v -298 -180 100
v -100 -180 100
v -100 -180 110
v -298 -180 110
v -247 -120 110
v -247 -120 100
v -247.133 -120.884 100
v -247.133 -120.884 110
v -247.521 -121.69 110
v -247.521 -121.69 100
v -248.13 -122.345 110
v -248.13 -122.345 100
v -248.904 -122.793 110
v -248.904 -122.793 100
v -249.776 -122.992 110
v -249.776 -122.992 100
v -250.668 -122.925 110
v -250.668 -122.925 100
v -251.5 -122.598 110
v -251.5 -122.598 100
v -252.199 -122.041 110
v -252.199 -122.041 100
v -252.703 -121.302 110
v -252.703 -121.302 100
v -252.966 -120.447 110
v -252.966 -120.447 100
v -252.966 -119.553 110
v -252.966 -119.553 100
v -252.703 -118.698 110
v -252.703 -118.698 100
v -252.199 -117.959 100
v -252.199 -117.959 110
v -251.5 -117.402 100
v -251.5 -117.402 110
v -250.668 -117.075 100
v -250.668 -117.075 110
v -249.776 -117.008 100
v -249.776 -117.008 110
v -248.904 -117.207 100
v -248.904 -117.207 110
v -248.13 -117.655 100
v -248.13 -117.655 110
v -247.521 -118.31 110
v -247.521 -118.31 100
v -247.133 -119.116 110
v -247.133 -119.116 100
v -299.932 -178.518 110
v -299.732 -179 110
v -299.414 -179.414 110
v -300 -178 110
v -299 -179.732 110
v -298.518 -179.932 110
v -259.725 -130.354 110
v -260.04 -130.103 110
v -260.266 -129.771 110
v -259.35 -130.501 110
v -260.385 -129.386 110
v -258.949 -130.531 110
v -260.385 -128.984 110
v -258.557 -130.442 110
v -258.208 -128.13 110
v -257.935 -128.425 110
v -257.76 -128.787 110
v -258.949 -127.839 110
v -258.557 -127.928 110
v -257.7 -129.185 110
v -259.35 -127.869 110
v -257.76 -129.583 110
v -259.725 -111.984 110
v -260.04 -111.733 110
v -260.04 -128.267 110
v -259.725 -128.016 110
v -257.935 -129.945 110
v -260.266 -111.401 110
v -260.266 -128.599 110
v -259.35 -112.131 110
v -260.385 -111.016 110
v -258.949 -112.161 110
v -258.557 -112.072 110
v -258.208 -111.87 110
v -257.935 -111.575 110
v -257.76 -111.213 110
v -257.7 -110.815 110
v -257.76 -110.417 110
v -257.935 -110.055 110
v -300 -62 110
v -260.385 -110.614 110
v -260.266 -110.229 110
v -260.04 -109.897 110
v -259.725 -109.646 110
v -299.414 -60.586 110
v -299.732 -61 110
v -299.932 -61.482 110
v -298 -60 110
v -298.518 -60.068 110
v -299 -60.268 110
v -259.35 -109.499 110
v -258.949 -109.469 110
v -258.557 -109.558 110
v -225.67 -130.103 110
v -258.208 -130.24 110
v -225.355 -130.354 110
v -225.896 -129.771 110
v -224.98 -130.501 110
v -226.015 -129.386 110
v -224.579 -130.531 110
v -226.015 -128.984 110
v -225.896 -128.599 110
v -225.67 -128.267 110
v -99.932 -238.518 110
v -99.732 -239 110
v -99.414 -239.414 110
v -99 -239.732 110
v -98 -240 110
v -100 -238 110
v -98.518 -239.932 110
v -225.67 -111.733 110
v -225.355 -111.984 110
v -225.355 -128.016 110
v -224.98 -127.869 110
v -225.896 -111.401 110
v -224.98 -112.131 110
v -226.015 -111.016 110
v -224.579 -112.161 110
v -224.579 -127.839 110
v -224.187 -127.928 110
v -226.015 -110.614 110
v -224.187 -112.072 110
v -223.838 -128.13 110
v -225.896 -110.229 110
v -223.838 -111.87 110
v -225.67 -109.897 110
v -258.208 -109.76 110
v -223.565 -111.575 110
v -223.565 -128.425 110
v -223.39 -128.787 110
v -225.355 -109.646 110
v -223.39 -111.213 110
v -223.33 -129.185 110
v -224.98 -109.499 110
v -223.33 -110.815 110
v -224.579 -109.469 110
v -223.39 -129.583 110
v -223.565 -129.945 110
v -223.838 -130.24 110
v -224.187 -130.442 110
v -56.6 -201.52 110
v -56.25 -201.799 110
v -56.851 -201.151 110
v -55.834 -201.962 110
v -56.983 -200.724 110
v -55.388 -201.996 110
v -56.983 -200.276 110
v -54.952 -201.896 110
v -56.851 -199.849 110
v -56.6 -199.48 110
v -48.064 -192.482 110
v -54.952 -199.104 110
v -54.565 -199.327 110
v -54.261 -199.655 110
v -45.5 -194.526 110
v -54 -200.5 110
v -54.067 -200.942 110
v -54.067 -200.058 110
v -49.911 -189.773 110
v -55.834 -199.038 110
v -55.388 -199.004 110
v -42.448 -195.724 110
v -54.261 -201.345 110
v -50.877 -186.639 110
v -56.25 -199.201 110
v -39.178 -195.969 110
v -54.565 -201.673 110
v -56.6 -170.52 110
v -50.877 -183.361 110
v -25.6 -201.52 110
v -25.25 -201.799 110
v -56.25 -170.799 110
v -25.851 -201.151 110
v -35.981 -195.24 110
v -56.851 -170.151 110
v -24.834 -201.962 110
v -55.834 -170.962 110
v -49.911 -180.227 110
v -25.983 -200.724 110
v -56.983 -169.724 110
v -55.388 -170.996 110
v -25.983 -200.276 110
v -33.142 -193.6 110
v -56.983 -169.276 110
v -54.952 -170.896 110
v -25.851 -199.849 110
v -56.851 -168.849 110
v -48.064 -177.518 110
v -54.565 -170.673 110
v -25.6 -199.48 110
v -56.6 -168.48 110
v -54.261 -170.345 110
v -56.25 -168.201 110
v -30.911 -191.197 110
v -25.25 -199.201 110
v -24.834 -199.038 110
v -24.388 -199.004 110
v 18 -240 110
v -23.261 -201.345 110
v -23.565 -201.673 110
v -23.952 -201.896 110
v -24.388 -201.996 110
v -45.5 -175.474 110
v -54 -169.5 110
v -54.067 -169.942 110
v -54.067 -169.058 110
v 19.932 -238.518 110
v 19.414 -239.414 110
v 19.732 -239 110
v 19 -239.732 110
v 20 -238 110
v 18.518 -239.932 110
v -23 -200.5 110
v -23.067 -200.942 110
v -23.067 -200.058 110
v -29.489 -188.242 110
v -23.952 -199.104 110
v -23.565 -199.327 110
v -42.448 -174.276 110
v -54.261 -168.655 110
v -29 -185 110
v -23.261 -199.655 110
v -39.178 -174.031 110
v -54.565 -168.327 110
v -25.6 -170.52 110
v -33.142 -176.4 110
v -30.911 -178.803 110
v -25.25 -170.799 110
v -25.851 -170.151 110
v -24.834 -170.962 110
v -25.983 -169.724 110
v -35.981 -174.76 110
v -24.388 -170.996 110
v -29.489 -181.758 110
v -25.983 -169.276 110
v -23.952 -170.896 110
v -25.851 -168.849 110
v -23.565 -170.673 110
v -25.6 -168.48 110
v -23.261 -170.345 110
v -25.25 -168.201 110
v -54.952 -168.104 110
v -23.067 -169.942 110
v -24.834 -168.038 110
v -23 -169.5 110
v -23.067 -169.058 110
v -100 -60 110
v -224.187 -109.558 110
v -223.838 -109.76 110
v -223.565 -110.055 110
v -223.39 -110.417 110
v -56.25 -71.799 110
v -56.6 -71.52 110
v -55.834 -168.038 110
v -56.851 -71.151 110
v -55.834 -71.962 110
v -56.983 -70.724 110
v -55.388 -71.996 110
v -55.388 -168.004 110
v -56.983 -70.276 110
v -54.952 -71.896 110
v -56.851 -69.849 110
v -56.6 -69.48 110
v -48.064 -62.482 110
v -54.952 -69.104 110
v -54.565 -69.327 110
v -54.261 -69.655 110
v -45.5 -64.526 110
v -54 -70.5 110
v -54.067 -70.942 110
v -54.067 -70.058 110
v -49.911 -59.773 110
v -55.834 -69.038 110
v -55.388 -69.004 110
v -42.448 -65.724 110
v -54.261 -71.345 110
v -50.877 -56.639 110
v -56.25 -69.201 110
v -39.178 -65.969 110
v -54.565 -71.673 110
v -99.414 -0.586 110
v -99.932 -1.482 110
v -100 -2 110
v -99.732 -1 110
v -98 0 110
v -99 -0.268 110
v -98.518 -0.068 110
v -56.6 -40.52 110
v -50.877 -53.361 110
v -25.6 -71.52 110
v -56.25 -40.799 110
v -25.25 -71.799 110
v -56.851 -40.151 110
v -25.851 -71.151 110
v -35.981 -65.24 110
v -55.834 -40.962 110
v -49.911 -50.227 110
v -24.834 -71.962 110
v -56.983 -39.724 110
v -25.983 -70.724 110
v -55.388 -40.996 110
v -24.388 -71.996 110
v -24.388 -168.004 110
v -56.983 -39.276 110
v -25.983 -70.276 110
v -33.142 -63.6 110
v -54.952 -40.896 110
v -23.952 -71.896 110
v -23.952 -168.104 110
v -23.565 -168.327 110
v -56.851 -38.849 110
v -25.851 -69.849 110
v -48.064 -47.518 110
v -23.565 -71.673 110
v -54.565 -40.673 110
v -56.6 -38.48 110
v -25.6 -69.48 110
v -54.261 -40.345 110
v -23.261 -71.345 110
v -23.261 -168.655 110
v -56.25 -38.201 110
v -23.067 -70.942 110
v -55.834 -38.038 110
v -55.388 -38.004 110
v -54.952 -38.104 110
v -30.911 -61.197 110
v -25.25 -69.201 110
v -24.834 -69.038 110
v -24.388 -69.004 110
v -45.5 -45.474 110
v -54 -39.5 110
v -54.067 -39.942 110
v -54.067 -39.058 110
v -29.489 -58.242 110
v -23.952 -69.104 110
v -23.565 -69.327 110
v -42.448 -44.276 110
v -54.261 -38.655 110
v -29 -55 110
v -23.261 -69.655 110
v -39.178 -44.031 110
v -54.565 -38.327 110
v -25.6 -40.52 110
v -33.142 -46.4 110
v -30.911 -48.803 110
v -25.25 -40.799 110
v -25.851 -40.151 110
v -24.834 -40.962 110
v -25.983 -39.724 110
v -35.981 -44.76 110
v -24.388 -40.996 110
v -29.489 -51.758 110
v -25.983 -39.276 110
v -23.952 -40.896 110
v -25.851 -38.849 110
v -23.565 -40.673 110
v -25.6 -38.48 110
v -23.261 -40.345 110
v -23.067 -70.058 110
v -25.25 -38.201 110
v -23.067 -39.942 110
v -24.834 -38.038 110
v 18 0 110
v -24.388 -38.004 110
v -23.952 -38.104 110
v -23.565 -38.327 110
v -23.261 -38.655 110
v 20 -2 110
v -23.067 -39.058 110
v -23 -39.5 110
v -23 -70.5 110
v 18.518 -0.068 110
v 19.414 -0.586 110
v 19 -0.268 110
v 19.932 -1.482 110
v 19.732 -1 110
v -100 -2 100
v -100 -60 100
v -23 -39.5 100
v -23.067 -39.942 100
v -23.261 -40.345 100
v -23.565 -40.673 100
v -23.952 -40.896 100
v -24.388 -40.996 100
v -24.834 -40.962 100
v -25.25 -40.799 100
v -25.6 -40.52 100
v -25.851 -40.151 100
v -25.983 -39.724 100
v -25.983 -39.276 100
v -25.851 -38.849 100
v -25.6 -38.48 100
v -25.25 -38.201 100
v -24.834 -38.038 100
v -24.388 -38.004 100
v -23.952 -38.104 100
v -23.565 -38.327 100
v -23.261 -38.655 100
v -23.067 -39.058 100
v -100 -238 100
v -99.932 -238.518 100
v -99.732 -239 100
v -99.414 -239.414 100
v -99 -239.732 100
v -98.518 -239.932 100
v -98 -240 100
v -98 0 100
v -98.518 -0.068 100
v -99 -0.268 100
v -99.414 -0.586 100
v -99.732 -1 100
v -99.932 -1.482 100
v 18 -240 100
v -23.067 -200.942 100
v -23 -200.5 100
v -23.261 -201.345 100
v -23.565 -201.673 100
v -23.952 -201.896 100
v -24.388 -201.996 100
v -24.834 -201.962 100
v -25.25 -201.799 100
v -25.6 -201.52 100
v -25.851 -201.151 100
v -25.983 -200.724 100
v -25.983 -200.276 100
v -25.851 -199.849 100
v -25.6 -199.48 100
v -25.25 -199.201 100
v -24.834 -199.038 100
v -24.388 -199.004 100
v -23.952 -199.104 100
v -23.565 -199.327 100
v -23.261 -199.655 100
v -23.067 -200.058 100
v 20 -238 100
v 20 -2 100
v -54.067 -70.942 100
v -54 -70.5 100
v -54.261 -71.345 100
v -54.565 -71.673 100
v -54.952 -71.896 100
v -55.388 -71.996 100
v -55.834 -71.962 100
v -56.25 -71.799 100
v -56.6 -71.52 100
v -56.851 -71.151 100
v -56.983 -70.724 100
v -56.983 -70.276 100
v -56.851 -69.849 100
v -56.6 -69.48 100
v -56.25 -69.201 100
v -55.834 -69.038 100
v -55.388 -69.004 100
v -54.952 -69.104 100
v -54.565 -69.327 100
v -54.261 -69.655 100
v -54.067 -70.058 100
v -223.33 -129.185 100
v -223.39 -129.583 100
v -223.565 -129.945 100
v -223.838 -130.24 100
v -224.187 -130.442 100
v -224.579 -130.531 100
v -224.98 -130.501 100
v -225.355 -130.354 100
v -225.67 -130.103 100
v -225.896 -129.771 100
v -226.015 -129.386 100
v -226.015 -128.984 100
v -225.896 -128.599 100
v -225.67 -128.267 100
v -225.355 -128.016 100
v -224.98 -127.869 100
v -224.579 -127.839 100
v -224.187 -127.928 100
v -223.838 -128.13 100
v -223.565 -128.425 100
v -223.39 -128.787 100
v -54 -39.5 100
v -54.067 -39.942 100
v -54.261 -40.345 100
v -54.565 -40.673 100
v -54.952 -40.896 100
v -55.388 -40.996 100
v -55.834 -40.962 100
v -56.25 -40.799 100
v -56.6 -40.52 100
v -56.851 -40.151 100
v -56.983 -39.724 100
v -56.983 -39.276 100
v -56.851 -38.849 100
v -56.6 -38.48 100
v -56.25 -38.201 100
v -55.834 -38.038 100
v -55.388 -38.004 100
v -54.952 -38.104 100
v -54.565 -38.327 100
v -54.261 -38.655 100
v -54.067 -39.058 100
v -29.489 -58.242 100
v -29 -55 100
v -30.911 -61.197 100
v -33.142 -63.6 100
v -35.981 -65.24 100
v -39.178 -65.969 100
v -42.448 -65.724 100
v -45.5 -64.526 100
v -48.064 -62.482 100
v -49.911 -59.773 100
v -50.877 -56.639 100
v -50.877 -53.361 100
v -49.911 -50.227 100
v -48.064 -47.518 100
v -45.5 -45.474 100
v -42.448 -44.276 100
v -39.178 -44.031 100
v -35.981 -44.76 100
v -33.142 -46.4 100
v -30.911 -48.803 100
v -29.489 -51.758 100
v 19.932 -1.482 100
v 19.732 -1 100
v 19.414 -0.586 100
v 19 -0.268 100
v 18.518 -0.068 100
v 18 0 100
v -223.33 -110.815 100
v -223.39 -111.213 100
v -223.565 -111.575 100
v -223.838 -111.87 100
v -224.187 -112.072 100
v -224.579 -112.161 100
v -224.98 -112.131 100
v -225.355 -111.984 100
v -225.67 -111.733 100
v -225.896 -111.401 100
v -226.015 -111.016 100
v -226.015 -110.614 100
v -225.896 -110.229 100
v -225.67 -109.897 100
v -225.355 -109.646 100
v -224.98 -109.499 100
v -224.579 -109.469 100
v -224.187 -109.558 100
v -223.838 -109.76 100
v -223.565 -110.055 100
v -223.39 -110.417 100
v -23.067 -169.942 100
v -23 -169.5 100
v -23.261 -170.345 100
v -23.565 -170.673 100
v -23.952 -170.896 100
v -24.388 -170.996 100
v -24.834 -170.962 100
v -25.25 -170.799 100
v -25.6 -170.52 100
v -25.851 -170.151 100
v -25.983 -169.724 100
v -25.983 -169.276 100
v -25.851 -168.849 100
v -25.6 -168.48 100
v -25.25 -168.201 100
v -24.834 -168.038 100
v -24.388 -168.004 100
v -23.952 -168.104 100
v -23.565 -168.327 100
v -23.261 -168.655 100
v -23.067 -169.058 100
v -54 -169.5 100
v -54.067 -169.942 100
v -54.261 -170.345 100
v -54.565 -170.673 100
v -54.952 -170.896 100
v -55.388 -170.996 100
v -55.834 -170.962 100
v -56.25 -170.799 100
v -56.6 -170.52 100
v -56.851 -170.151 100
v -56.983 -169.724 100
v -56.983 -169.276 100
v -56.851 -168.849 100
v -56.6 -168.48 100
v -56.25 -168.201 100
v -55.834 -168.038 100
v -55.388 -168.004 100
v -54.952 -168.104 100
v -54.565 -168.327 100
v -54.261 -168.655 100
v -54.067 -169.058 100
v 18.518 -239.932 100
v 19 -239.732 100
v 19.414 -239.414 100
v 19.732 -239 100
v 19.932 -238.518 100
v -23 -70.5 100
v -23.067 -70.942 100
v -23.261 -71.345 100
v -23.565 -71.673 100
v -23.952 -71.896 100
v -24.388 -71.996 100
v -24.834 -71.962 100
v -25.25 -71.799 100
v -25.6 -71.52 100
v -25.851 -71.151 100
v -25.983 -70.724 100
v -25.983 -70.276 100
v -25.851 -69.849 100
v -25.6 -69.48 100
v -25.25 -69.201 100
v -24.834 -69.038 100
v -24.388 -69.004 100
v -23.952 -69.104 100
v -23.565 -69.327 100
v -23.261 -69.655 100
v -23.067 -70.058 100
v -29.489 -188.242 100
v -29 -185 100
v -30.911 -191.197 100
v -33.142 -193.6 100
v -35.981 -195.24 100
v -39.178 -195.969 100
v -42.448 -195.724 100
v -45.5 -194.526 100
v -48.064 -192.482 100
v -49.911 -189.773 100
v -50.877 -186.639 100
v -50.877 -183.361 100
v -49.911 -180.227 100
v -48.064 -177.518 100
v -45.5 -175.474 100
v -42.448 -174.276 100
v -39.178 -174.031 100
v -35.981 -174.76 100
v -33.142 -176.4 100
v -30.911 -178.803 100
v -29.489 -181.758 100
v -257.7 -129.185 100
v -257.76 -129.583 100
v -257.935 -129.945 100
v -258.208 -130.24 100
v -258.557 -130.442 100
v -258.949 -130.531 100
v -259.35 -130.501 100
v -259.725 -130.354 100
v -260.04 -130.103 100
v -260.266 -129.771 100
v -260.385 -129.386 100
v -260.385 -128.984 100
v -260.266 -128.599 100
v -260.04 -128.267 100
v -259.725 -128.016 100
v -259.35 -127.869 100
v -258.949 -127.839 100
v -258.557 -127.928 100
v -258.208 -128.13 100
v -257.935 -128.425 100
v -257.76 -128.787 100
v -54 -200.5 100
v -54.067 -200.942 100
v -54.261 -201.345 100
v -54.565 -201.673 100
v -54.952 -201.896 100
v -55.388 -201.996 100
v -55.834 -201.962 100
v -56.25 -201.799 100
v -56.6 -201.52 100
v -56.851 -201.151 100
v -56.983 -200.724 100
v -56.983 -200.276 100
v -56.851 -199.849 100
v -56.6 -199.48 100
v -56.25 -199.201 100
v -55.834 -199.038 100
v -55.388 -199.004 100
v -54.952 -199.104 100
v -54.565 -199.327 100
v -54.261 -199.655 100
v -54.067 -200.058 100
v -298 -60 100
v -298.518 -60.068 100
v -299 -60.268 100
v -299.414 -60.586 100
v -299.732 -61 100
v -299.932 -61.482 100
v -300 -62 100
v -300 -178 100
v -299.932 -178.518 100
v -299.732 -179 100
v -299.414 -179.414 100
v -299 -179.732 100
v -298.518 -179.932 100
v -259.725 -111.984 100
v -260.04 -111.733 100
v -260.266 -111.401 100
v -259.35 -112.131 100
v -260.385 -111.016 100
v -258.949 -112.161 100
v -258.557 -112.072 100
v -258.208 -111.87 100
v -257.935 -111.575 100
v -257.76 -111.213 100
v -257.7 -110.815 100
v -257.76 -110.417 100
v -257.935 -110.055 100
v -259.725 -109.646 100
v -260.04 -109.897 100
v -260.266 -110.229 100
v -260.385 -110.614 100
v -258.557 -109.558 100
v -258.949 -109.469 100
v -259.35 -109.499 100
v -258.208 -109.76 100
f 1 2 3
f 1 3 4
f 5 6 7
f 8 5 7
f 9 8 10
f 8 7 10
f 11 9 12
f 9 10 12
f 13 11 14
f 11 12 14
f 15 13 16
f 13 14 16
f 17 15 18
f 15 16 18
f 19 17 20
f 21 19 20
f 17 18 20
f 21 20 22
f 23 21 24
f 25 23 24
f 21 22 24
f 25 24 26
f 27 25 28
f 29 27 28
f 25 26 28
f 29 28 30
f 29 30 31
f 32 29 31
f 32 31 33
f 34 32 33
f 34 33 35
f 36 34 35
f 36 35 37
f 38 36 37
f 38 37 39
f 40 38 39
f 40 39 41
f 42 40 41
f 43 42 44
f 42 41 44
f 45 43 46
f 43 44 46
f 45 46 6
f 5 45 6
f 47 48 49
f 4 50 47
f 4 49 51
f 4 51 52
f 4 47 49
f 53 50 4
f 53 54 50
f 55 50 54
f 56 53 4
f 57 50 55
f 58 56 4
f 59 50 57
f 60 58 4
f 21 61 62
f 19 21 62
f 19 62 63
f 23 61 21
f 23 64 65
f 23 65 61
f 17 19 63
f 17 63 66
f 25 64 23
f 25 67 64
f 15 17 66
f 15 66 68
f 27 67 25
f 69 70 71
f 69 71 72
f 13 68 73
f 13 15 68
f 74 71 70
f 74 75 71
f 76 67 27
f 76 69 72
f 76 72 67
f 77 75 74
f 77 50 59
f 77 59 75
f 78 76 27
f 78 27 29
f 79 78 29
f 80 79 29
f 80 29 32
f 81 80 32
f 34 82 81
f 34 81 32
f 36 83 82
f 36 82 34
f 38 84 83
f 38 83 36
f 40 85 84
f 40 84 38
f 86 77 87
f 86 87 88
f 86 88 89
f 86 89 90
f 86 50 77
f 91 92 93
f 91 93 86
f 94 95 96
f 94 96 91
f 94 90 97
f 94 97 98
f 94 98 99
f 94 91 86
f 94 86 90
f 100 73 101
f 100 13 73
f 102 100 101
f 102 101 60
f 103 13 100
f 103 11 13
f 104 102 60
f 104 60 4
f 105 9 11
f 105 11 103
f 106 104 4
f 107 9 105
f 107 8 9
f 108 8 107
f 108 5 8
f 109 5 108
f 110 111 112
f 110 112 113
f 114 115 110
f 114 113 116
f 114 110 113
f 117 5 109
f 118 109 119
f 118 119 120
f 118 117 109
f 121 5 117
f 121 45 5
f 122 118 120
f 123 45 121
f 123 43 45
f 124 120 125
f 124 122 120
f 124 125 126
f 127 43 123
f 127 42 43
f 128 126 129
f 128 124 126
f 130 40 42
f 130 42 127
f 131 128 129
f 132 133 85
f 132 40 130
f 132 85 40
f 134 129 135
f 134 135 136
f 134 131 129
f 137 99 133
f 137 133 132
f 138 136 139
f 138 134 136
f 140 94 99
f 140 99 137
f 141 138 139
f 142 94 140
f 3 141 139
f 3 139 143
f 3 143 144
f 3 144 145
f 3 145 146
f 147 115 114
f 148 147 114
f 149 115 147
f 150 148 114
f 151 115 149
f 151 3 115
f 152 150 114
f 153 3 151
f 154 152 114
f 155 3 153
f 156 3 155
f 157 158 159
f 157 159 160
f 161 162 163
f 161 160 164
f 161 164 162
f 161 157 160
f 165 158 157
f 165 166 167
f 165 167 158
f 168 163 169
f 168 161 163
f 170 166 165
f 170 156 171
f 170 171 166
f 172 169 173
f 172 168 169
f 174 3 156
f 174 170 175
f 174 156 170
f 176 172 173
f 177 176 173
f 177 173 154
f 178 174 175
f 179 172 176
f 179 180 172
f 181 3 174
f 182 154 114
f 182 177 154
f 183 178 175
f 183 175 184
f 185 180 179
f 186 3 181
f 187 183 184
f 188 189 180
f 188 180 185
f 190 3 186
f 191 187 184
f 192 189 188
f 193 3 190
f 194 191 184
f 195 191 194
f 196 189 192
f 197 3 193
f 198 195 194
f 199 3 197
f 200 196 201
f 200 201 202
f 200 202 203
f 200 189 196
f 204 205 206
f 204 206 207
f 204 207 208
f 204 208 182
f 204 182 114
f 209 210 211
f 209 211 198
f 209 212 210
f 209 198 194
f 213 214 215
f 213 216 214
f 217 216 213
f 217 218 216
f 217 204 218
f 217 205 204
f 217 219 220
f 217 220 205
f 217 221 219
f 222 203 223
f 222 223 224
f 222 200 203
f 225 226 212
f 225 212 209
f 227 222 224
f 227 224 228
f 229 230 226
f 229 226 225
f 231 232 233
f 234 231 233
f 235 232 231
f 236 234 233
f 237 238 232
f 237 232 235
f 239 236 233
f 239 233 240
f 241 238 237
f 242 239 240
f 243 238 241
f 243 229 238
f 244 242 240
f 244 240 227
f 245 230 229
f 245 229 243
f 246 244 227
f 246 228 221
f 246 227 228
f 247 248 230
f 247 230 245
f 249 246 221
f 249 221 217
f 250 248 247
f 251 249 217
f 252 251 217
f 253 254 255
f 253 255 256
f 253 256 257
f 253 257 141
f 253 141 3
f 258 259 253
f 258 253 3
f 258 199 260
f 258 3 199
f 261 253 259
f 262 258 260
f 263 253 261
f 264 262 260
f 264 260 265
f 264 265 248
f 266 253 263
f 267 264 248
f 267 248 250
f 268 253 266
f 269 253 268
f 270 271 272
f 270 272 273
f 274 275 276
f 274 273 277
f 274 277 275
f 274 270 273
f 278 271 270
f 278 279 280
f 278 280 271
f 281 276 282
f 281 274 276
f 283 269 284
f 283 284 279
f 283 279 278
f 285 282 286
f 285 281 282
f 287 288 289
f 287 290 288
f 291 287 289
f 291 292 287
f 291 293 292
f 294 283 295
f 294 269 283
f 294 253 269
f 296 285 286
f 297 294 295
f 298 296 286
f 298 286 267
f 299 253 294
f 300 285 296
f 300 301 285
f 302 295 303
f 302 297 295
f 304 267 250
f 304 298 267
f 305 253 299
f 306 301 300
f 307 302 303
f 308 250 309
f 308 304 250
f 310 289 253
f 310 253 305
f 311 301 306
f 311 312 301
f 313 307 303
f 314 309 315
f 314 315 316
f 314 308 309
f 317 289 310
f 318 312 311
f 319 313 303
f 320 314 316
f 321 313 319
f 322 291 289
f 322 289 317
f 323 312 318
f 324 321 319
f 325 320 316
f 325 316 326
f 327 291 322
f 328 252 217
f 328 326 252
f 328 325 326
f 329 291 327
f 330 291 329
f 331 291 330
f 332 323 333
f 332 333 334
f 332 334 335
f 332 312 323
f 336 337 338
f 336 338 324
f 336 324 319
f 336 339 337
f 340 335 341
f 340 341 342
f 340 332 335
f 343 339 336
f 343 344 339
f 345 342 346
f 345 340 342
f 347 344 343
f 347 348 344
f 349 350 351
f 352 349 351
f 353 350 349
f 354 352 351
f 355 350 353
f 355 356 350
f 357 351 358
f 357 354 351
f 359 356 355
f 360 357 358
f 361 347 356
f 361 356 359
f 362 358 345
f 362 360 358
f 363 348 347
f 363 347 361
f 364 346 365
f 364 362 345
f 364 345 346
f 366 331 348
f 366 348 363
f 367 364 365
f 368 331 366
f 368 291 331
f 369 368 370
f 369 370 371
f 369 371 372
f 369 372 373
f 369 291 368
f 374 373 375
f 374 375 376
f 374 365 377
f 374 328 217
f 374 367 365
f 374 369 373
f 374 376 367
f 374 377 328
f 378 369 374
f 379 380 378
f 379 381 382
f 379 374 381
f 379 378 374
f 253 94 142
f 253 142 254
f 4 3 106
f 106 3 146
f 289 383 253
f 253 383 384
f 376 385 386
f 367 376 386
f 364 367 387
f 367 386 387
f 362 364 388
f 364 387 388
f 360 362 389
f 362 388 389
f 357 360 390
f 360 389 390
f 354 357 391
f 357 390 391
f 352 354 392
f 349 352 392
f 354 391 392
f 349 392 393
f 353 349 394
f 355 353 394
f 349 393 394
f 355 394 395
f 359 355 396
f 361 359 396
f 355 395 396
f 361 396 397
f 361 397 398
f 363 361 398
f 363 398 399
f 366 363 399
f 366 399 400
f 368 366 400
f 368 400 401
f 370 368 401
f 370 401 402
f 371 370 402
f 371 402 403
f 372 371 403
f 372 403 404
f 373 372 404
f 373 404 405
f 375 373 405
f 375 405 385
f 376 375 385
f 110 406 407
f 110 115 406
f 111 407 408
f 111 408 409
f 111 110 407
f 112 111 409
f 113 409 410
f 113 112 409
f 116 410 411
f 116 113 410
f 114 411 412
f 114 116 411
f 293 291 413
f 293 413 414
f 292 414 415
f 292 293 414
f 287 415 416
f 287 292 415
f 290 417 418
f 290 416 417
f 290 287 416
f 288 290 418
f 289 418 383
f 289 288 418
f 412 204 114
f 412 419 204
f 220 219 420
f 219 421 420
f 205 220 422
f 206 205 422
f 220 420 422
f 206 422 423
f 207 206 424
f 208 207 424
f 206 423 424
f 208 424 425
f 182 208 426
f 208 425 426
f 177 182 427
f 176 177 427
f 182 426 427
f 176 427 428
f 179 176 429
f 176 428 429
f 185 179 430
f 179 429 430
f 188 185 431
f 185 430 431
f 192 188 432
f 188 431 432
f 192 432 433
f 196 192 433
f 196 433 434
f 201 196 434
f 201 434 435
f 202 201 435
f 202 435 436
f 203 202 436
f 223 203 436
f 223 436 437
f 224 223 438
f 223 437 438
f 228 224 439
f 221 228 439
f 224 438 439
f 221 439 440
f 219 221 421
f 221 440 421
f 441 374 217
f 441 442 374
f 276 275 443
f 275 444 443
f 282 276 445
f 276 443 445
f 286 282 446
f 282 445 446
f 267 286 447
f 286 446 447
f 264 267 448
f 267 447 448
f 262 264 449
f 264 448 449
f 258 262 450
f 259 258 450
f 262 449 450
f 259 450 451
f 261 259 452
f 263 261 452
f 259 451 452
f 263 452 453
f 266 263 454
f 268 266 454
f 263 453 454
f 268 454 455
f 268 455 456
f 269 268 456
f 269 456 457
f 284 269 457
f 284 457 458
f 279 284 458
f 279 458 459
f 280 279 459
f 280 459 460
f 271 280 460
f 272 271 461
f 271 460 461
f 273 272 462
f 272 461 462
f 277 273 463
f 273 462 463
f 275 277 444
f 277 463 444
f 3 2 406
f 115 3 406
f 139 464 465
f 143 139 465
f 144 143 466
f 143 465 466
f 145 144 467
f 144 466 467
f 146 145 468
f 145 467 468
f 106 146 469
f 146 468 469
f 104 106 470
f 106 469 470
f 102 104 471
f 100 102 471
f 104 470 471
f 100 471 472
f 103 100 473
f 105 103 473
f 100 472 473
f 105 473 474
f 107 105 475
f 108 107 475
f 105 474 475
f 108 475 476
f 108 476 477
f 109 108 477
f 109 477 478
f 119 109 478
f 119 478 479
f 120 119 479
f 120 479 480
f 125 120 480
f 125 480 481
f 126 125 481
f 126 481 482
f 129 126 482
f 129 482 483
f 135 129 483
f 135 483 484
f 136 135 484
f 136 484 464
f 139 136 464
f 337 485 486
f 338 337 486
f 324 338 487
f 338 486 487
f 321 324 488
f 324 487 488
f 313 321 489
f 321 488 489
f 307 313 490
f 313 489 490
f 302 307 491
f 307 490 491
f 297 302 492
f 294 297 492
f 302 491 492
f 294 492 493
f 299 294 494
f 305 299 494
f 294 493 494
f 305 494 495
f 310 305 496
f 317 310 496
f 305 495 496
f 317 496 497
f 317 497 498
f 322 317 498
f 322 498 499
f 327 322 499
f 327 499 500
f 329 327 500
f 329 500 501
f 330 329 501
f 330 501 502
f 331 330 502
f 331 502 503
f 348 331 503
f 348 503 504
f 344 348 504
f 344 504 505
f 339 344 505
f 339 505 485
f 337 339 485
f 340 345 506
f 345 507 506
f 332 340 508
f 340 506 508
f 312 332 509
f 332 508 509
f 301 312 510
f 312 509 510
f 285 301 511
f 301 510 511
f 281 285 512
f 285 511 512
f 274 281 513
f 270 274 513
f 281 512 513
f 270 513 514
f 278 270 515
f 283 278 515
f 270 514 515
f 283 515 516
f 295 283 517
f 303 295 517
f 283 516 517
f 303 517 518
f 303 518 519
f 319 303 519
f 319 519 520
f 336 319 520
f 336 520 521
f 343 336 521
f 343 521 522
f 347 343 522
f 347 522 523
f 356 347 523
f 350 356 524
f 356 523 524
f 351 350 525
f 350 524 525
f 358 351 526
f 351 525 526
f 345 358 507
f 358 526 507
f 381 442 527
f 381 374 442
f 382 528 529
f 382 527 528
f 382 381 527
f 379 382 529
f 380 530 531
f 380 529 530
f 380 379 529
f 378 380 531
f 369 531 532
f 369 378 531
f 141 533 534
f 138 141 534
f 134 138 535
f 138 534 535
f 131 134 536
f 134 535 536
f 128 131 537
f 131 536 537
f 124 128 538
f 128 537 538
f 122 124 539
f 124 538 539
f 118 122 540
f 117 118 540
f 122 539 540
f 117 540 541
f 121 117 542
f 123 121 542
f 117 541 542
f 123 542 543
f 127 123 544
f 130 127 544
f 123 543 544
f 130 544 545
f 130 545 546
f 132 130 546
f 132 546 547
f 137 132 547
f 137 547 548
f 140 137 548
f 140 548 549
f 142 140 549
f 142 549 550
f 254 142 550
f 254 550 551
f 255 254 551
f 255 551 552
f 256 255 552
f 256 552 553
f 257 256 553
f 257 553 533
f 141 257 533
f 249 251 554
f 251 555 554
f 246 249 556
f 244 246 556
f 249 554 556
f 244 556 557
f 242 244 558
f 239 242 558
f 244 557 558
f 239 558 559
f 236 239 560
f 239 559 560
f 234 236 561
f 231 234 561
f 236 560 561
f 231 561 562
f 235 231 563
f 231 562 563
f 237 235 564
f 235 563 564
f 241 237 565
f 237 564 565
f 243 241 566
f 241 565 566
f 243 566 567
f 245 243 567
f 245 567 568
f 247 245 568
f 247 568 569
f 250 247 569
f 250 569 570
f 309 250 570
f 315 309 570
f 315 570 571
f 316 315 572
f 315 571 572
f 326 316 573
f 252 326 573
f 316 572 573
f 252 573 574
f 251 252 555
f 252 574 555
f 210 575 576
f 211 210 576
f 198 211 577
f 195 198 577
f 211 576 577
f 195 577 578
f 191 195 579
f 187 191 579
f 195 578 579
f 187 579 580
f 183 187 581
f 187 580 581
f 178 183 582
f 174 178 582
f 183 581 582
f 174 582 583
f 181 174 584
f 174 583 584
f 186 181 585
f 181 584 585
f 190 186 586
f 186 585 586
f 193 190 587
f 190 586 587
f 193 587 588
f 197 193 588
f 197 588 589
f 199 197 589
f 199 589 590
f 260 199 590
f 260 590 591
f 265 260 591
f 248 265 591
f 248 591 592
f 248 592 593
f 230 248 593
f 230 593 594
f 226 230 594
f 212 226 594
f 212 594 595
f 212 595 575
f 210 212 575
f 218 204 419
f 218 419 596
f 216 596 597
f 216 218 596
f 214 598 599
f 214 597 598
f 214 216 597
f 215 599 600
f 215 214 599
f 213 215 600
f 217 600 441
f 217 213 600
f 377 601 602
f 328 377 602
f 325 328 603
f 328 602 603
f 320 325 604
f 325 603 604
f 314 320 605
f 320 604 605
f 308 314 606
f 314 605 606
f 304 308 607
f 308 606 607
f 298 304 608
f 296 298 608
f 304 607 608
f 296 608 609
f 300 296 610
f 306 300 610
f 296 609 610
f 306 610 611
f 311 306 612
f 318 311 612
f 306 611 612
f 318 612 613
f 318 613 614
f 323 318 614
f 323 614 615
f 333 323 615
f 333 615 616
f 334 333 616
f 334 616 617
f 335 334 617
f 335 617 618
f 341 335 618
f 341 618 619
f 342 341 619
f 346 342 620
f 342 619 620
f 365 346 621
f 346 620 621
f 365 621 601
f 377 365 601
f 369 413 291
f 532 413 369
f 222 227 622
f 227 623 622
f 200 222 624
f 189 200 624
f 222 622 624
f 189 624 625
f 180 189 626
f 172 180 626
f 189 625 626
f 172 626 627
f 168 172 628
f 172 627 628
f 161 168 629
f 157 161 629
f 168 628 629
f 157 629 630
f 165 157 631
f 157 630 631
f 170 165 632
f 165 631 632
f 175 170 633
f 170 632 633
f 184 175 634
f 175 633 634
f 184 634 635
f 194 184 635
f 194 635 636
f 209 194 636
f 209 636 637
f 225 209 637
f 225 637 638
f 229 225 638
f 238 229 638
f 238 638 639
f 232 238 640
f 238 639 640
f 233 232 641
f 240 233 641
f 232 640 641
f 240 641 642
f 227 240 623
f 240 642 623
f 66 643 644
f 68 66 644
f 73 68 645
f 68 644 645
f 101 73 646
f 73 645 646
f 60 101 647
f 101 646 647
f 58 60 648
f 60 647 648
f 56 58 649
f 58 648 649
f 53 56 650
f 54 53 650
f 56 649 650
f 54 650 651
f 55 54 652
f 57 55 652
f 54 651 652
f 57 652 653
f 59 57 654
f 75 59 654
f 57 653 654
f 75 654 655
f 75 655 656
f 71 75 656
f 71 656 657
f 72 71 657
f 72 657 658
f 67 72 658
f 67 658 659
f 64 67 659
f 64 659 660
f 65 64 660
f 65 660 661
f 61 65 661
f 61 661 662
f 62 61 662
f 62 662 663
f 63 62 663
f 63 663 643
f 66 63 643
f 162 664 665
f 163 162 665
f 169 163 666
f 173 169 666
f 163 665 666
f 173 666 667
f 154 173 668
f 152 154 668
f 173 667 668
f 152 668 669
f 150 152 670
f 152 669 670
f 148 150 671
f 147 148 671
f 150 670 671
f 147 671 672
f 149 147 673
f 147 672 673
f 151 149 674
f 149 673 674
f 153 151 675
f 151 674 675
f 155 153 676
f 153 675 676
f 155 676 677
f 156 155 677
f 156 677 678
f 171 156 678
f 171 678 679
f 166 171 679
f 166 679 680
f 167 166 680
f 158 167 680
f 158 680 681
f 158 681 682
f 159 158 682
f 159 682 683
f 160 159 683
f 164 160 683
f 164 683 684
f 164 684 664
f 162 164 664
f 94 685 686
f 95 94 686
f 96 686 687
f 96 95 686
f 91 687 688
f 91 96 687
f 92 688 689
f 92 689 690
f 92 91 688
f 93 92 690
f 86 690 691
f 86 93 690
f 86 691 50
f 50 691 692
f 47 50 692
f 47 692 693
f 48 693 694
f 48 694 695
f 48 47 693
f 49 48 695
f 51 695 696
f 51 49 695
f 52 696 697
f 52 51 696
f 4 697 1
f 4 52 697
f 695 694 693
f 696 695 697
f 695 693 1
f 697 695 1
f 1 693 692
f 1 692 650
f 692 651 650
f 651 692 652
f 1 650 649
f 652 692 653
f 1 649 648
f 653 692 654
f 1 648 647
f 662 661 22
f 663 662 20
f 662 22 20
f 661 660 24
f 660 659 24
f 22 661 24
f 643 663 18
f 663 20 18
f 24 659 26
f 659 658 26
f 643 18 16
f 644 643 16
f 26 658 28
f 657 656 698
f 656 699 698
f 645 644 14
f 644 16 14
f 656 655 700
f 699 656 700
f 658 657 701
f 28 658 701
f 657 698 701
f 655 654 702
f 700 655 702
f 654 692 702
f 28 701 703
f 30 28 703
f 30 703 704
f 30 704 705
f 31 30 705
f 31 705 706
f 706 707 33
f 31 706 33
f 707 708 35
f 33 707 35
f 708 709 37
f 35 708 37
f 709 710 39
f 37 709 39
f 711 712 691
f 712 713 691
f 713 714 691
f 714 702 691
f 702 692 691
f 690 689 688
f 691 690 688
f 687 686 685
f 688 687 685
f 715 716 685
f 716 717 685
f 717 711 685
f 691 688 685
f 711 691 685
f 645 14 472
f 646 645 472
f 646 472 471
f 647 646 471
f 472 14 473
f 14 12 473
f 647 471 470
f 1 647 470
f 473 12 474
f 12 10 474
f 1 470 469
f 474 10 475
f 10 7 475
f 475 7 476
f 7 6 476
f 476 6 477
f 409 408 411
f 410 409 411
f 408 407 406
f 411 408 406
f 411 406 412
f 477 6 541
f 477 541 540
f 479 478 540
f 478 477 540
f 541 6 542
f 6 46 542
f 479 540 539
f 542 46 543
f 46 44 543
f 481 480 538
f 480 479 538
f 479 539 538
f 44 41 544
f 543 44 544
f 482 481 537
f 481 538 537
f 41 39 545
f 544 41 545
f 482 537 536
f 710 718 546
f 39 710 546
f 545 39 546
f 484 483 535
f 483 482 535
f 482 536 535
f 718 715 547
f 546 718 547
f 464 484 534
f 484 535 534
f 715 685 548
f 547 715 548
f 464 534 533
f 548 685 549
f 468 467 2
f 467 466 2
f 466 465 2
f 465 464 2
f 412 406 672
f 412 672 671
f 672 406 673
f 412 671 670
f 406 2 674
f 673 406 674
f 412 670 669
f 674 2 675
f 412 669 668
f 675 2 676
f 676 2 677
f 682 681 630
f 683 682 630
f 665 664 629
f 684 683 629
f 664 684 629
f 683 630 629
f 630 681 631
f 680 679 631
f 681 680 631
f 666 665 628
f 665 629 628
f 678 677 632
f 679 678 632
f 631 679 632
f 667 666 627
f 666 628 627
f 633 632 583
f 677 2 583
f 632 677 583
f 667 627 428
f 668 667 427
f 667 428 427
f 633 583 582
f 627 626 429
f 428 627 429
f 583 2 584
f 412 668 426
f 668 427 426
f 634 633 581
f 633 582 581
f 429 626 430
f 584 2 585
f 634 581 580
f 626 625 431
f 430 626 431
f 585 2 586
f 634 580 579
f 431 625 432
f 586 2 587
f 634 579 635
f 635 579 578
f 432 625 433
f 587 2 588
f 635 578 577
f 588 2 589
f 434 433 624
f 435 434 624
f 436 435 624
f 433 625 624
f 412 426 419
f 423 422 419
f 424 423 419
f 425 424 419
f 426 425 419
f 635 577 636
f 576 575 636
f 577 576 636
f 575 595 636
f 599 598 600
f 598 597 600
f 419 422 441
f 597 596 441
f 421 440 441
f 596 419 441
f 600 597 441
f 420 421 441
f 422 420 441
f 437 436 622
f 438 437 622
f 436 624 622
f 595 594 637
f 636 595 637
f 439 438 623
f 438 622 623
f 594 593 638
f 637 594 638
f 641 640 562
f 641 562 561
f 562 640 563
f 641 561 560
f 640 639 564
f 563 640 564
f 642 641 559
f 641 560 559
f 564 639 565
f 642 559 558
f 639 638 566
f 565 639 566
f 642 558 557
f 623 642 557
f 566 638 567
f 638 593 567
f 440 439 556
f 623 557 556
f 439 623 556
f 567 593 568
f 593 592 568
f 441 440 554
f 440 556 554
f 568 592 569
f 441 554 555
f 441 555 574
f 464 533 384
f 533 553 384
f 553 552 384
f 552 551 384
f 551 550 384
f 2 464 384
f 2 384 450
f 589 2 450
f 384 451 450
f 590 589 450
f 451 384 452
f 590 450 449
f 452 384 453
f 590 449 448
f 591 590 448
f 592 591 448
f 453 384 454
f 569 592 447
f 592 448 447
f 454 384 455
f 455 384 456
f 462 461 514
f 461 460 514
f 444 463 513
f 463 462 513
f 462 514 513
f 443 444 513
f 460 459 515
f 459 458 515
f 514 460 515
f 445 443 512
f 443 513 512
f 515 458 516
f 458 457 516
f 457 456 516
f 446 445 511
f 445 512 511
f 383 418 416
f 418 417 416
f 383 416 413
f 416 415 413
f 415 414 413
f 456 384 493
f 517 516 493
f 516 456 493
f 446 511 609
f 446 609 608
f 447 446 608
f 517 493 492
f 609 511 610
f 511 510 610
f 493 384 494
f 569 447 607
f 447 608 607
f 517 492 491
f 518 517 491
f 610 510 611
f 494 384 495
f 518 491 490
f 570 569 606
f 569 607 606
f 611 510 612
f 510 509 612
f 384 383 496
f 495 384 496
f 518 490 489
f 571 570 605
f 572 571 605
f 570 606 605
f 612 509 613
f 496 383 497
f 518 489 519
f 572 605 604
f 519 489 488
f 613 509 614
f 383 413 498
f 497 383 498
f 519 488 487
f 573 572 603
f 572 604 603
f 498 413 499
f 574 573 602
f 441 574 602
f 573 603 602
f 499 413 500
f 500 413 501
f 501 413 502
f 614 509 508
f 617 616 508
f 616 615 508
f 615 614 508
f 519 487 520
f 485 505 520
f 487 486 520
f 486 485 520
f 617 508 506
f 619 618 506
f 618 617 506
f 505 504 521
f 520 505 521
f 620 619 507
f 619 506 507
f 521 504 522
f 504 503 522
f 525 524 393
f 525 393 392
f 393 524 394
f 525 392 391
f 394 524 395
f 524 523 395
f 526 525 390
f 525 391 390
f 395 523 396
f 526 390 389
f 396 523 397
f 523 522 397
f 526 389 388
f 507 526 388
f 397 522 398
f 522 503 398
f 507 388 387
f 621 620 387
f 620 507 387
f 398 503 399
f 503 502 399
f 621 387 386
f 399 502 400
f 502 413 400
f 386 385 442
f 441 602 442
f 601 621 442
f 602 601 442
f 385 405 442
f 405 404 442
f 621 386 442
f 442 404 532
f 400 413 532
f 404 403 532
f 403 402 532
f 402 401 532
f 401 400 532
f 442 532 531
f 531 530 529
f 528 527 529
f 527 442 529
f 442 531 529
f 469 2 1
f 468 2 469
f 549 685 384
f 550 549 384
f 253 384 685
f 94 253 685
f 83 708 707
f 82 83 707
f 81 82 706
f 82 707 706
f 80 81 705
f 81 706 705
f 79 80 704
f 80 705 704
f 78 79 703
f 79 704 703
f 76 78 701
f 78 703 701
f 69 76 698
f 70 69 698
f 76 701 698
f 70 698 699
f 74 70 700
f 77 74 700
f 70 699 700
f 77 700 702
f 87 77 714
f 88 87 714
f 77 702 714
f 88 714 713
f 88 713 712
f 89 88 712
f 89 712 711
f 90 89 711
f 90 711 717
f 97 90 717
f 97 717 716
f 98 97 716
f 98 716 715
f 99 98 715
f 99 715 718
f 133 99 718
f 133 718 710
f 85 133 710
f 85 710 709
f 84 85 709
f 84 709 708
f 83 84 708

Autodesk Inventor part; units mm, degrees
sketch "Basis" plane through (0, 0, 0) normal (0, 0, 1) x (1, 0, 0)
  line L0 (0, 150) -> (0, -150)
  line L1 (-79.5351, 0) -> (153.2558, 0) projected
  line L2 (0, -282) -> (0, 222) projected
  line L3 (30, -50) -> (30, -210)
  line L4 (0, -200) -> (20, -200)
  line L5 (0, -40) -> (120, -40)
  line L6 (0, 40) -> (120, 40)
  line L7 (110, -30) -> (110, 30)
  point P0 (0, 0)
  point P1 (110, 0)
  dimension "d32" = 300
  dimension "d38" = 80
  dimension "d39" = 10
  dimension "d40" = 10
  dimension "d41" = 10
  dimension "d43" = 240
  dimension "d44" = 240
  dimension "d45" = 60
  dimension "d46" = 10
  dimension "d47" = 10
  dimension "d48" = 160
  dimension "d49" = 10
ref_plane "Arbeitsebene7" through (120, 40, 0) normal (0, 1, 0) x (-1, 0, 0)
sketch "Skizze12" plane through (120, 40, 0) normal (0, 1, 0) x (-1, 0, 0)
  line L0 (10, -10) -> (10, -80)
  line L1 (20, -70) -> (120, -70)
  line L2 (120, -100.8) -> (120, 16.8) projected
  point P0 (120, 0)
  point P1 (10, 0)
  point P2 (10, 0)
  point P3 (10, 0)
  dimension "d50" = 70
  dimension "d51" = 10
  dimension "d80" = 10
  dimension "d81" = 10
ref_plane "Arbeitsebene8" through (120, -40, 0) normal (0, 1, 0) x (-1, 0, 0)
sketch "Skizze13" plane through (120, -40, 0) normal (0, 1, 0) x (-1, 0, 0)
  line L0 (10, -10) -> (10, -80) projected
  line L1 (10, -10) -> (10, -80)
  line L2 (20, -70) -> (120, -70)
  line L3 (120, -100.8) -> (120, 16.8) projected
  point P0 (120, 0)
  dimension "d82" = 10
  dimension "d83" = 10
ref_plane "Arbeitsebene9" through (20, -200, 0) normal (0, -1, 0) x (1, 0, 0)
sketch "Skizze14" plane through (20, -200, 0) normal (0, -1, 0) x (1, 0, 0)
  line L0 (10, -10) -> (10, -50)
  point P0 (-20, 0)
  point P1 (10, 0)
  point P2 (10, 0)
  point P3 (10, 0)
  dimension "d52" = 40
  dimension "d53" = 10
ref_plane "Arbeitsebene10" through (20, -140, 0) normal (0, -1, 0) x (1, 0, 0)
sketch "Skizze15" plane through (20, -140, 0) normal (0, -1, 0) x (1, 0, 0)
  line L0 (10, -10) -> (10, -50) projected
  line L1 (10, -10) -> (10, -50)
  point P0 (-20, 0)
ref_plane "Arbeitsebene12" through (110, 40, -80) normal (1, 0, 0) x (0, 1, 0)
sketch "Skizze16" plane through (110, 40, -80) normal (1, 0, 0) x (0, 1, 0)
  line L0 (-90, 0) -> (10, 0)
  line L1 (10, 0) -> (10, -4)
  line L2 (10, -4) -> (-90, -4)
  line L3 (-90, -4) -> (-90, 0)
  line L4 (-70, 10) -> (-10, 10)
  line L5 (0, 70) -> (0, 0) projected
  line L6 (-80, 70) -> (-80, 0) projected
  point P0 (-40, 80)
  dimension "d66" = 4
  dimension "d67" = 10
  dimension "d68" = 10
  dimension "d77" = 10
  dimension "d78" = 10
  dimension "d79" = 10
ref_plane "Arbeitsebene17" through (110, -50, -84) normal (0, 0, 1) x (1, 0, 0)
sketch "Skizze18" plane through (110, -50, -84) normal (0, 0, 1) x (1, 0, 0)
  line L0 (-110, -232) -> (-110, 272) projected
  line L1 (-189.5351, 50) -> (43.2558, 50) projected
  line L2 (-19.5, 65.5) -> (-50.5, 65.5) construction
  line L3 (-50.5, 65.5) -> (-50.5, 34.5) construction
  line L4 (-19.5, 65.5) -> (-19.5, 34.5) construction
  line L5 (-19.5, 34.5) -> (-50.5, 34.5) construction
  point P0 (-110, 50)
  point P1 (-35, 50)
  dimension "d69" = 75
  dimension "d70" = 15.5
  dimension "d71" = 15.5
  dimension "d72" = 31
  dimension "d73" = 31
ref_plane "Arbeitsebene18" through (30, -140, -50) normal (1, 0, 0) x (0, 1, 0)
sketch "Skizze19" plane through (30, -140, -50) normal (1, 0, 0) x (0, 1, 0)
  line L0 (10, -4) -> (-70, -4)
  line L1 (-70, -4) -> (-70, 0)
  line L2 (-70, 0) -> (10, 0)
  line L3 (10, 0) -> (10, -4)
  line L4 (-50, 10) -> (-10, 10)
  point P0 (140, 50)
  point P1 (-60, 0)
  point P2 (0, 0)
  dimension "d74" = 4
  dimension "d75" = 10
  dimension "d76" = 10
  dimension "d84" = 10
  dimension "d85" = 10
  dimension "d86" = 10
ref_plane "Arbeitsebene19" through (30, -210, -54) normal (0, 0, 1) x (1, 0, 0)
ref_plane "Arbeitsebene20" through (20, 2.5, 100) normal (0, 0, -1) x (-1, 0, 0)
sketch "Skizze 1" plane through (-280, -73.3, 100) normal (0, 0, 1) x (1, 0, 0)
  line L0 (-20, 13.3) -> (-20, 11.3) projected
  line L1 (180, 13.3) -> (-20, 13.3) projected
  line L2 (180, -106.7) -> (-20, -106.7) projected
  line L3 (-20, -104.7) -> (-20, -106.7) projected
  line L4 (180, 53.3) -> (180, -146.7) projected
  line L5 (180, 73.3) -> (180, -166.7) projected
  line L6 (300, 73.3) -> (300, -166.7) projected
  line L7 (180, 73.3) -> (182, 73.3) projected
  line L8 (298, 73.3) -> (300, 73.3) projected
  line L9 (300, -166.7) -> (298, -166.7) projected
  line L10 (182, -166.7) -> (180, -166.7) projected
  line L11 (-20, -106.7) -> (-20, 13.3) projected
  line L12 (180, 13.3) -> (-20, 13.3) projected
  line L13 (180, 13.3) -> (180, 73.3) projected
  line L14 (180, 73.3) -> (300, 73.3) projected
  line L15 (300, -166.7) -> (300, 73.3) projected
  line L16 (300, -166.7) -> (180, -166.7) projected
  line L17 (180, -166.7) -> (180, -106.7) projected
  line L18 (180, -106.7) -> (-20, -106.7) projected
extrude "Extrusion3" add sketch "Skizze 1" along normal blind 10
sketch "Skizze23" plane through (20, -242.5, 0) normal (1, 0, 0) x (0, 0, -1)
  line L0 (0, 245) -> (0, 0) projected
  line L1 (-100, 245) -> (0, 245) projected
  line L2 (0, 0) -> (-100, 0)
  line L3 (-100, 0) -> (-100, 245)
  line L4 (-100, 245) -> (0, 245)
  line L5 (0, 245) -> (0, 0)
  point P0 (0, 242.5)
extrude "Extrusion4" cut sketch "Skizze23" against normal through all
sketch "Skizze20" plane through (30, -210, 100) normal (0, 0, 1) x (1, 0, 0)
  line L0 (0, 80) -> (0, 0) projected
  line L1 (-217.5819, 99.185) -> (-324.0785, 99.185) construction
  line L2 (-223.1225, 80.815) -> (-333.4519, 80.815) construction
  line L3 (-289.05, 125.855) -> (-289.05, 54.145) construction
  line L4 (-254.68, 148.5562) -> (-254.68, 51.145) construction
  line L5 (-44.2587, 170.5) -> (-93.3542, 170.5) construction
  line L6 (-85.5, 183.5563) -> (-85.5, 134.1968) construction
  line L7 (-97.1508, 139.5) -> (-51.7506, 139.5) construction
  line L8 (-54.5, 132.7748) -> (-54.5, 177.4853) construction
  line L9 (-327.4713, 90) -> (-3.4708, 90) construction
  line L10 (-70, 254.6178) -> (-70, -44.1957) construction
  line L11 (-130, 210) -> (-10, 210) construction
  line L12 (-330, 30) -> (-330, 150) construction
  circle A0 centre (-289.05, 99.185) radius 1.35
  circle A1 centre (-254.68, 99.185) radius 1.35
  circle A2 centre (-254.68, 80.815) radius 1.35
  circle A3 centre (-289.05, 80.815) radius 1.35
  circle A4 centre (-280, 90) radius 3
  circle A5 centre (-85.5, 170.5) radius 1.5
  circle A6 centre (-85.5, 139.5) radius 1.5
  circle A7 centre (-54.5, 139.5) radius 1.5
  circle A8 centre (-54.5, 170.5) radius 1.5
  circle A9 centre (-70, 155) radius 11
  point P0 (-30, 210)
  point P1 (-70, 210)
  point P2 (-330, 90)
  point P3 (-289.05, 90)
  dimension "d102" = 2.7
  dimension "d103" = 2.7
  dimension "d104" = 2.7
  dimension "d105" = 2.7
  dimension "d106" = 6
  dimension "d107" = 9.05
  dimension "d108" = 9.185
  dimension "d109" = 18.37
  dimension "d111" = 34.37
  dimension "d112" = 50
  dimension "d113" = 31
  dimension "d114" = 31
  dimension "d115" = 15.5
  dimension "d116" = 15.5
  dimension "d117" = 55
  dimension "d118" = 3
  dimension "d119" = 3
  dimension "d120" = 3
  dimension "d121" = 3
  dimension "d122" = 22
extrude "Extrusion5" cut sketch "Skizze20" along normal through all
ref_plane "Arbeitsebene21" through (-297.4713, -120, 100) normal (0, 1, 0) x (1, 0, 0)
mirror "Spiegeln1" about plane through (-297.4713, -120, 100) normal (0, 1, 0) of "Extrusion5"
fillet "Rundung1" radius 2 6 edges at (20, -240, 105) (20, 0, 105) (-100, 0, 105) (-300, -60, 105) (-300, -180, 105) (-100, -240, 105)
equation "\"d38\" = Bas_Haupt_Breite"
equation "\"d39\" = 0.5 * Alu_Prof"
equation "\"d40\" = d39"
equation "\"d41\" = d39"
equation "\"d43\" = Bas_Haupt_Länge + Alu_Prof"
equation "\"d44\" = d43"
equation "\"d45\" = Bas_Ver_Breite"
equation "\"d46\" = d39"
equation "\"d47\" = d39"
equation "\"d48\" = Bas_Ver_Länge"
equation "\"d49\" = d39"
equation "\"d50\" = Bas_Haupt_Höhe - 0.5 * Alu_Prof"
equation "\"d51\" = d39"
equation "\"d80\" = d51"
equation "\"d81\" = d51"
equation "\"d82\" = d81"
equation "\"d83\" = d81"
equation "\"d52\" = GM_Halt_Höhe - 0.5 * Alu_Prof"
equation "\"d53\" = d39"
equation "\"d66\" = Bas_Haupt_Plat_Höhe"
equation "\"d67\" = 0.5 * Alu_Prof"
equation "\"d68\" = d67"
equation "\"d77\" = d68"
equation "\"d78\" = d68"
equation "\"d79\" = d68"
equation "\"d69\" = 0.5 * SM_Pos_Abstand"
equation "\"d70\" = 0.5 * SM_Schrauben_Pos_Abstand"
equation "\"d71\" = d70"
equation "\"d72\" = SM_Schrauben_Pos_Abstand"
equation "\"d73\" = SM_Schrauben_Pos_Abstand"
equation "\"d74\" = GM_Platte_Höhe"
equation "\"d75\" = 0.5 * Alu_Prof"
equation "\"d76\" = d75"
equation "\"d84\" = d76"
equation "\"d85\" = d76"
equation "\"d86\" = d76"
equation "\"Zet_Kluppen_Höhe\" = 7"
equation "\"Zet_KluppenDicke\" = 1"
equation "\"Zet_Höhe\" = 5"
equation "\"Zet_Kluppen_Breite\" = 10"
equation "\"St_kurz_Breite\" = 10"
equation "\"Zet_Breite\" = 210"
equation "\"Gel_Mot_St_Breite\" = 10"
equation "\"Gel_Mot_St_2\" = 35"
equation "\"St_kurz_Höhe\" = 7.5"
equation "\"Gel_Mot_St_Höhe\" = 5"
equation "\"St_kurz_Länge\" = 140"
equation "\"St_lang_Länge\" = 180"
equation "\"Bas_Ver_Breite\" = 60"
equation "\"Bas_Ver_Länge\" = 160"
equation "\"Gel_Mot_St_1\" = 35"
equation "\"SM_Pos_Abstand\" = 150"
equation "\"GM_Halt_Höhe\" = 50"
equation "\"Bas_Haupt_Höhe\" = 80"
equation "\"Bas_Haupt_Breite\" = 80"
equation "\"Bas_Haupt_Länge\" = 220"
equation "\"Druck_teil_Höhe\" = 7.5"
equation "\"Druck_teil_Durchmesser\" = 50"
equation "\"Alu_Prof\" = 20"
equation "\"Bas_Haupt_Plat_Höhe\" = 4"
equation "\"SM_Scheibe_Durchmesser\" = 22"
equation "\"SM_Schrauben_Pos_Abstand\" = 31"
equation "\"GM_Platte_Höhe\" = 4"
equation "\"Rundung_Platte\" = 2"
equation "\"GM_Schrauben_Pos_Abstand_lang\" = 34.37"
equation "\"GM_Stift_Durchmesser\" = 6"
equation "\"GM_Schrauben_Pos_Abstand_kurz\" = 18.37"
equation "\"GM_Schrauben_Durchgangsloch\" = 2.7"
equation "\"GM_Schrauben_Pos_Stift_rlang\" = 9.05"
equation "\"GM_Schrauben_Pos_Stift_rkurz\" = 9.185"
properties part number "BT000_trajan20_21"
